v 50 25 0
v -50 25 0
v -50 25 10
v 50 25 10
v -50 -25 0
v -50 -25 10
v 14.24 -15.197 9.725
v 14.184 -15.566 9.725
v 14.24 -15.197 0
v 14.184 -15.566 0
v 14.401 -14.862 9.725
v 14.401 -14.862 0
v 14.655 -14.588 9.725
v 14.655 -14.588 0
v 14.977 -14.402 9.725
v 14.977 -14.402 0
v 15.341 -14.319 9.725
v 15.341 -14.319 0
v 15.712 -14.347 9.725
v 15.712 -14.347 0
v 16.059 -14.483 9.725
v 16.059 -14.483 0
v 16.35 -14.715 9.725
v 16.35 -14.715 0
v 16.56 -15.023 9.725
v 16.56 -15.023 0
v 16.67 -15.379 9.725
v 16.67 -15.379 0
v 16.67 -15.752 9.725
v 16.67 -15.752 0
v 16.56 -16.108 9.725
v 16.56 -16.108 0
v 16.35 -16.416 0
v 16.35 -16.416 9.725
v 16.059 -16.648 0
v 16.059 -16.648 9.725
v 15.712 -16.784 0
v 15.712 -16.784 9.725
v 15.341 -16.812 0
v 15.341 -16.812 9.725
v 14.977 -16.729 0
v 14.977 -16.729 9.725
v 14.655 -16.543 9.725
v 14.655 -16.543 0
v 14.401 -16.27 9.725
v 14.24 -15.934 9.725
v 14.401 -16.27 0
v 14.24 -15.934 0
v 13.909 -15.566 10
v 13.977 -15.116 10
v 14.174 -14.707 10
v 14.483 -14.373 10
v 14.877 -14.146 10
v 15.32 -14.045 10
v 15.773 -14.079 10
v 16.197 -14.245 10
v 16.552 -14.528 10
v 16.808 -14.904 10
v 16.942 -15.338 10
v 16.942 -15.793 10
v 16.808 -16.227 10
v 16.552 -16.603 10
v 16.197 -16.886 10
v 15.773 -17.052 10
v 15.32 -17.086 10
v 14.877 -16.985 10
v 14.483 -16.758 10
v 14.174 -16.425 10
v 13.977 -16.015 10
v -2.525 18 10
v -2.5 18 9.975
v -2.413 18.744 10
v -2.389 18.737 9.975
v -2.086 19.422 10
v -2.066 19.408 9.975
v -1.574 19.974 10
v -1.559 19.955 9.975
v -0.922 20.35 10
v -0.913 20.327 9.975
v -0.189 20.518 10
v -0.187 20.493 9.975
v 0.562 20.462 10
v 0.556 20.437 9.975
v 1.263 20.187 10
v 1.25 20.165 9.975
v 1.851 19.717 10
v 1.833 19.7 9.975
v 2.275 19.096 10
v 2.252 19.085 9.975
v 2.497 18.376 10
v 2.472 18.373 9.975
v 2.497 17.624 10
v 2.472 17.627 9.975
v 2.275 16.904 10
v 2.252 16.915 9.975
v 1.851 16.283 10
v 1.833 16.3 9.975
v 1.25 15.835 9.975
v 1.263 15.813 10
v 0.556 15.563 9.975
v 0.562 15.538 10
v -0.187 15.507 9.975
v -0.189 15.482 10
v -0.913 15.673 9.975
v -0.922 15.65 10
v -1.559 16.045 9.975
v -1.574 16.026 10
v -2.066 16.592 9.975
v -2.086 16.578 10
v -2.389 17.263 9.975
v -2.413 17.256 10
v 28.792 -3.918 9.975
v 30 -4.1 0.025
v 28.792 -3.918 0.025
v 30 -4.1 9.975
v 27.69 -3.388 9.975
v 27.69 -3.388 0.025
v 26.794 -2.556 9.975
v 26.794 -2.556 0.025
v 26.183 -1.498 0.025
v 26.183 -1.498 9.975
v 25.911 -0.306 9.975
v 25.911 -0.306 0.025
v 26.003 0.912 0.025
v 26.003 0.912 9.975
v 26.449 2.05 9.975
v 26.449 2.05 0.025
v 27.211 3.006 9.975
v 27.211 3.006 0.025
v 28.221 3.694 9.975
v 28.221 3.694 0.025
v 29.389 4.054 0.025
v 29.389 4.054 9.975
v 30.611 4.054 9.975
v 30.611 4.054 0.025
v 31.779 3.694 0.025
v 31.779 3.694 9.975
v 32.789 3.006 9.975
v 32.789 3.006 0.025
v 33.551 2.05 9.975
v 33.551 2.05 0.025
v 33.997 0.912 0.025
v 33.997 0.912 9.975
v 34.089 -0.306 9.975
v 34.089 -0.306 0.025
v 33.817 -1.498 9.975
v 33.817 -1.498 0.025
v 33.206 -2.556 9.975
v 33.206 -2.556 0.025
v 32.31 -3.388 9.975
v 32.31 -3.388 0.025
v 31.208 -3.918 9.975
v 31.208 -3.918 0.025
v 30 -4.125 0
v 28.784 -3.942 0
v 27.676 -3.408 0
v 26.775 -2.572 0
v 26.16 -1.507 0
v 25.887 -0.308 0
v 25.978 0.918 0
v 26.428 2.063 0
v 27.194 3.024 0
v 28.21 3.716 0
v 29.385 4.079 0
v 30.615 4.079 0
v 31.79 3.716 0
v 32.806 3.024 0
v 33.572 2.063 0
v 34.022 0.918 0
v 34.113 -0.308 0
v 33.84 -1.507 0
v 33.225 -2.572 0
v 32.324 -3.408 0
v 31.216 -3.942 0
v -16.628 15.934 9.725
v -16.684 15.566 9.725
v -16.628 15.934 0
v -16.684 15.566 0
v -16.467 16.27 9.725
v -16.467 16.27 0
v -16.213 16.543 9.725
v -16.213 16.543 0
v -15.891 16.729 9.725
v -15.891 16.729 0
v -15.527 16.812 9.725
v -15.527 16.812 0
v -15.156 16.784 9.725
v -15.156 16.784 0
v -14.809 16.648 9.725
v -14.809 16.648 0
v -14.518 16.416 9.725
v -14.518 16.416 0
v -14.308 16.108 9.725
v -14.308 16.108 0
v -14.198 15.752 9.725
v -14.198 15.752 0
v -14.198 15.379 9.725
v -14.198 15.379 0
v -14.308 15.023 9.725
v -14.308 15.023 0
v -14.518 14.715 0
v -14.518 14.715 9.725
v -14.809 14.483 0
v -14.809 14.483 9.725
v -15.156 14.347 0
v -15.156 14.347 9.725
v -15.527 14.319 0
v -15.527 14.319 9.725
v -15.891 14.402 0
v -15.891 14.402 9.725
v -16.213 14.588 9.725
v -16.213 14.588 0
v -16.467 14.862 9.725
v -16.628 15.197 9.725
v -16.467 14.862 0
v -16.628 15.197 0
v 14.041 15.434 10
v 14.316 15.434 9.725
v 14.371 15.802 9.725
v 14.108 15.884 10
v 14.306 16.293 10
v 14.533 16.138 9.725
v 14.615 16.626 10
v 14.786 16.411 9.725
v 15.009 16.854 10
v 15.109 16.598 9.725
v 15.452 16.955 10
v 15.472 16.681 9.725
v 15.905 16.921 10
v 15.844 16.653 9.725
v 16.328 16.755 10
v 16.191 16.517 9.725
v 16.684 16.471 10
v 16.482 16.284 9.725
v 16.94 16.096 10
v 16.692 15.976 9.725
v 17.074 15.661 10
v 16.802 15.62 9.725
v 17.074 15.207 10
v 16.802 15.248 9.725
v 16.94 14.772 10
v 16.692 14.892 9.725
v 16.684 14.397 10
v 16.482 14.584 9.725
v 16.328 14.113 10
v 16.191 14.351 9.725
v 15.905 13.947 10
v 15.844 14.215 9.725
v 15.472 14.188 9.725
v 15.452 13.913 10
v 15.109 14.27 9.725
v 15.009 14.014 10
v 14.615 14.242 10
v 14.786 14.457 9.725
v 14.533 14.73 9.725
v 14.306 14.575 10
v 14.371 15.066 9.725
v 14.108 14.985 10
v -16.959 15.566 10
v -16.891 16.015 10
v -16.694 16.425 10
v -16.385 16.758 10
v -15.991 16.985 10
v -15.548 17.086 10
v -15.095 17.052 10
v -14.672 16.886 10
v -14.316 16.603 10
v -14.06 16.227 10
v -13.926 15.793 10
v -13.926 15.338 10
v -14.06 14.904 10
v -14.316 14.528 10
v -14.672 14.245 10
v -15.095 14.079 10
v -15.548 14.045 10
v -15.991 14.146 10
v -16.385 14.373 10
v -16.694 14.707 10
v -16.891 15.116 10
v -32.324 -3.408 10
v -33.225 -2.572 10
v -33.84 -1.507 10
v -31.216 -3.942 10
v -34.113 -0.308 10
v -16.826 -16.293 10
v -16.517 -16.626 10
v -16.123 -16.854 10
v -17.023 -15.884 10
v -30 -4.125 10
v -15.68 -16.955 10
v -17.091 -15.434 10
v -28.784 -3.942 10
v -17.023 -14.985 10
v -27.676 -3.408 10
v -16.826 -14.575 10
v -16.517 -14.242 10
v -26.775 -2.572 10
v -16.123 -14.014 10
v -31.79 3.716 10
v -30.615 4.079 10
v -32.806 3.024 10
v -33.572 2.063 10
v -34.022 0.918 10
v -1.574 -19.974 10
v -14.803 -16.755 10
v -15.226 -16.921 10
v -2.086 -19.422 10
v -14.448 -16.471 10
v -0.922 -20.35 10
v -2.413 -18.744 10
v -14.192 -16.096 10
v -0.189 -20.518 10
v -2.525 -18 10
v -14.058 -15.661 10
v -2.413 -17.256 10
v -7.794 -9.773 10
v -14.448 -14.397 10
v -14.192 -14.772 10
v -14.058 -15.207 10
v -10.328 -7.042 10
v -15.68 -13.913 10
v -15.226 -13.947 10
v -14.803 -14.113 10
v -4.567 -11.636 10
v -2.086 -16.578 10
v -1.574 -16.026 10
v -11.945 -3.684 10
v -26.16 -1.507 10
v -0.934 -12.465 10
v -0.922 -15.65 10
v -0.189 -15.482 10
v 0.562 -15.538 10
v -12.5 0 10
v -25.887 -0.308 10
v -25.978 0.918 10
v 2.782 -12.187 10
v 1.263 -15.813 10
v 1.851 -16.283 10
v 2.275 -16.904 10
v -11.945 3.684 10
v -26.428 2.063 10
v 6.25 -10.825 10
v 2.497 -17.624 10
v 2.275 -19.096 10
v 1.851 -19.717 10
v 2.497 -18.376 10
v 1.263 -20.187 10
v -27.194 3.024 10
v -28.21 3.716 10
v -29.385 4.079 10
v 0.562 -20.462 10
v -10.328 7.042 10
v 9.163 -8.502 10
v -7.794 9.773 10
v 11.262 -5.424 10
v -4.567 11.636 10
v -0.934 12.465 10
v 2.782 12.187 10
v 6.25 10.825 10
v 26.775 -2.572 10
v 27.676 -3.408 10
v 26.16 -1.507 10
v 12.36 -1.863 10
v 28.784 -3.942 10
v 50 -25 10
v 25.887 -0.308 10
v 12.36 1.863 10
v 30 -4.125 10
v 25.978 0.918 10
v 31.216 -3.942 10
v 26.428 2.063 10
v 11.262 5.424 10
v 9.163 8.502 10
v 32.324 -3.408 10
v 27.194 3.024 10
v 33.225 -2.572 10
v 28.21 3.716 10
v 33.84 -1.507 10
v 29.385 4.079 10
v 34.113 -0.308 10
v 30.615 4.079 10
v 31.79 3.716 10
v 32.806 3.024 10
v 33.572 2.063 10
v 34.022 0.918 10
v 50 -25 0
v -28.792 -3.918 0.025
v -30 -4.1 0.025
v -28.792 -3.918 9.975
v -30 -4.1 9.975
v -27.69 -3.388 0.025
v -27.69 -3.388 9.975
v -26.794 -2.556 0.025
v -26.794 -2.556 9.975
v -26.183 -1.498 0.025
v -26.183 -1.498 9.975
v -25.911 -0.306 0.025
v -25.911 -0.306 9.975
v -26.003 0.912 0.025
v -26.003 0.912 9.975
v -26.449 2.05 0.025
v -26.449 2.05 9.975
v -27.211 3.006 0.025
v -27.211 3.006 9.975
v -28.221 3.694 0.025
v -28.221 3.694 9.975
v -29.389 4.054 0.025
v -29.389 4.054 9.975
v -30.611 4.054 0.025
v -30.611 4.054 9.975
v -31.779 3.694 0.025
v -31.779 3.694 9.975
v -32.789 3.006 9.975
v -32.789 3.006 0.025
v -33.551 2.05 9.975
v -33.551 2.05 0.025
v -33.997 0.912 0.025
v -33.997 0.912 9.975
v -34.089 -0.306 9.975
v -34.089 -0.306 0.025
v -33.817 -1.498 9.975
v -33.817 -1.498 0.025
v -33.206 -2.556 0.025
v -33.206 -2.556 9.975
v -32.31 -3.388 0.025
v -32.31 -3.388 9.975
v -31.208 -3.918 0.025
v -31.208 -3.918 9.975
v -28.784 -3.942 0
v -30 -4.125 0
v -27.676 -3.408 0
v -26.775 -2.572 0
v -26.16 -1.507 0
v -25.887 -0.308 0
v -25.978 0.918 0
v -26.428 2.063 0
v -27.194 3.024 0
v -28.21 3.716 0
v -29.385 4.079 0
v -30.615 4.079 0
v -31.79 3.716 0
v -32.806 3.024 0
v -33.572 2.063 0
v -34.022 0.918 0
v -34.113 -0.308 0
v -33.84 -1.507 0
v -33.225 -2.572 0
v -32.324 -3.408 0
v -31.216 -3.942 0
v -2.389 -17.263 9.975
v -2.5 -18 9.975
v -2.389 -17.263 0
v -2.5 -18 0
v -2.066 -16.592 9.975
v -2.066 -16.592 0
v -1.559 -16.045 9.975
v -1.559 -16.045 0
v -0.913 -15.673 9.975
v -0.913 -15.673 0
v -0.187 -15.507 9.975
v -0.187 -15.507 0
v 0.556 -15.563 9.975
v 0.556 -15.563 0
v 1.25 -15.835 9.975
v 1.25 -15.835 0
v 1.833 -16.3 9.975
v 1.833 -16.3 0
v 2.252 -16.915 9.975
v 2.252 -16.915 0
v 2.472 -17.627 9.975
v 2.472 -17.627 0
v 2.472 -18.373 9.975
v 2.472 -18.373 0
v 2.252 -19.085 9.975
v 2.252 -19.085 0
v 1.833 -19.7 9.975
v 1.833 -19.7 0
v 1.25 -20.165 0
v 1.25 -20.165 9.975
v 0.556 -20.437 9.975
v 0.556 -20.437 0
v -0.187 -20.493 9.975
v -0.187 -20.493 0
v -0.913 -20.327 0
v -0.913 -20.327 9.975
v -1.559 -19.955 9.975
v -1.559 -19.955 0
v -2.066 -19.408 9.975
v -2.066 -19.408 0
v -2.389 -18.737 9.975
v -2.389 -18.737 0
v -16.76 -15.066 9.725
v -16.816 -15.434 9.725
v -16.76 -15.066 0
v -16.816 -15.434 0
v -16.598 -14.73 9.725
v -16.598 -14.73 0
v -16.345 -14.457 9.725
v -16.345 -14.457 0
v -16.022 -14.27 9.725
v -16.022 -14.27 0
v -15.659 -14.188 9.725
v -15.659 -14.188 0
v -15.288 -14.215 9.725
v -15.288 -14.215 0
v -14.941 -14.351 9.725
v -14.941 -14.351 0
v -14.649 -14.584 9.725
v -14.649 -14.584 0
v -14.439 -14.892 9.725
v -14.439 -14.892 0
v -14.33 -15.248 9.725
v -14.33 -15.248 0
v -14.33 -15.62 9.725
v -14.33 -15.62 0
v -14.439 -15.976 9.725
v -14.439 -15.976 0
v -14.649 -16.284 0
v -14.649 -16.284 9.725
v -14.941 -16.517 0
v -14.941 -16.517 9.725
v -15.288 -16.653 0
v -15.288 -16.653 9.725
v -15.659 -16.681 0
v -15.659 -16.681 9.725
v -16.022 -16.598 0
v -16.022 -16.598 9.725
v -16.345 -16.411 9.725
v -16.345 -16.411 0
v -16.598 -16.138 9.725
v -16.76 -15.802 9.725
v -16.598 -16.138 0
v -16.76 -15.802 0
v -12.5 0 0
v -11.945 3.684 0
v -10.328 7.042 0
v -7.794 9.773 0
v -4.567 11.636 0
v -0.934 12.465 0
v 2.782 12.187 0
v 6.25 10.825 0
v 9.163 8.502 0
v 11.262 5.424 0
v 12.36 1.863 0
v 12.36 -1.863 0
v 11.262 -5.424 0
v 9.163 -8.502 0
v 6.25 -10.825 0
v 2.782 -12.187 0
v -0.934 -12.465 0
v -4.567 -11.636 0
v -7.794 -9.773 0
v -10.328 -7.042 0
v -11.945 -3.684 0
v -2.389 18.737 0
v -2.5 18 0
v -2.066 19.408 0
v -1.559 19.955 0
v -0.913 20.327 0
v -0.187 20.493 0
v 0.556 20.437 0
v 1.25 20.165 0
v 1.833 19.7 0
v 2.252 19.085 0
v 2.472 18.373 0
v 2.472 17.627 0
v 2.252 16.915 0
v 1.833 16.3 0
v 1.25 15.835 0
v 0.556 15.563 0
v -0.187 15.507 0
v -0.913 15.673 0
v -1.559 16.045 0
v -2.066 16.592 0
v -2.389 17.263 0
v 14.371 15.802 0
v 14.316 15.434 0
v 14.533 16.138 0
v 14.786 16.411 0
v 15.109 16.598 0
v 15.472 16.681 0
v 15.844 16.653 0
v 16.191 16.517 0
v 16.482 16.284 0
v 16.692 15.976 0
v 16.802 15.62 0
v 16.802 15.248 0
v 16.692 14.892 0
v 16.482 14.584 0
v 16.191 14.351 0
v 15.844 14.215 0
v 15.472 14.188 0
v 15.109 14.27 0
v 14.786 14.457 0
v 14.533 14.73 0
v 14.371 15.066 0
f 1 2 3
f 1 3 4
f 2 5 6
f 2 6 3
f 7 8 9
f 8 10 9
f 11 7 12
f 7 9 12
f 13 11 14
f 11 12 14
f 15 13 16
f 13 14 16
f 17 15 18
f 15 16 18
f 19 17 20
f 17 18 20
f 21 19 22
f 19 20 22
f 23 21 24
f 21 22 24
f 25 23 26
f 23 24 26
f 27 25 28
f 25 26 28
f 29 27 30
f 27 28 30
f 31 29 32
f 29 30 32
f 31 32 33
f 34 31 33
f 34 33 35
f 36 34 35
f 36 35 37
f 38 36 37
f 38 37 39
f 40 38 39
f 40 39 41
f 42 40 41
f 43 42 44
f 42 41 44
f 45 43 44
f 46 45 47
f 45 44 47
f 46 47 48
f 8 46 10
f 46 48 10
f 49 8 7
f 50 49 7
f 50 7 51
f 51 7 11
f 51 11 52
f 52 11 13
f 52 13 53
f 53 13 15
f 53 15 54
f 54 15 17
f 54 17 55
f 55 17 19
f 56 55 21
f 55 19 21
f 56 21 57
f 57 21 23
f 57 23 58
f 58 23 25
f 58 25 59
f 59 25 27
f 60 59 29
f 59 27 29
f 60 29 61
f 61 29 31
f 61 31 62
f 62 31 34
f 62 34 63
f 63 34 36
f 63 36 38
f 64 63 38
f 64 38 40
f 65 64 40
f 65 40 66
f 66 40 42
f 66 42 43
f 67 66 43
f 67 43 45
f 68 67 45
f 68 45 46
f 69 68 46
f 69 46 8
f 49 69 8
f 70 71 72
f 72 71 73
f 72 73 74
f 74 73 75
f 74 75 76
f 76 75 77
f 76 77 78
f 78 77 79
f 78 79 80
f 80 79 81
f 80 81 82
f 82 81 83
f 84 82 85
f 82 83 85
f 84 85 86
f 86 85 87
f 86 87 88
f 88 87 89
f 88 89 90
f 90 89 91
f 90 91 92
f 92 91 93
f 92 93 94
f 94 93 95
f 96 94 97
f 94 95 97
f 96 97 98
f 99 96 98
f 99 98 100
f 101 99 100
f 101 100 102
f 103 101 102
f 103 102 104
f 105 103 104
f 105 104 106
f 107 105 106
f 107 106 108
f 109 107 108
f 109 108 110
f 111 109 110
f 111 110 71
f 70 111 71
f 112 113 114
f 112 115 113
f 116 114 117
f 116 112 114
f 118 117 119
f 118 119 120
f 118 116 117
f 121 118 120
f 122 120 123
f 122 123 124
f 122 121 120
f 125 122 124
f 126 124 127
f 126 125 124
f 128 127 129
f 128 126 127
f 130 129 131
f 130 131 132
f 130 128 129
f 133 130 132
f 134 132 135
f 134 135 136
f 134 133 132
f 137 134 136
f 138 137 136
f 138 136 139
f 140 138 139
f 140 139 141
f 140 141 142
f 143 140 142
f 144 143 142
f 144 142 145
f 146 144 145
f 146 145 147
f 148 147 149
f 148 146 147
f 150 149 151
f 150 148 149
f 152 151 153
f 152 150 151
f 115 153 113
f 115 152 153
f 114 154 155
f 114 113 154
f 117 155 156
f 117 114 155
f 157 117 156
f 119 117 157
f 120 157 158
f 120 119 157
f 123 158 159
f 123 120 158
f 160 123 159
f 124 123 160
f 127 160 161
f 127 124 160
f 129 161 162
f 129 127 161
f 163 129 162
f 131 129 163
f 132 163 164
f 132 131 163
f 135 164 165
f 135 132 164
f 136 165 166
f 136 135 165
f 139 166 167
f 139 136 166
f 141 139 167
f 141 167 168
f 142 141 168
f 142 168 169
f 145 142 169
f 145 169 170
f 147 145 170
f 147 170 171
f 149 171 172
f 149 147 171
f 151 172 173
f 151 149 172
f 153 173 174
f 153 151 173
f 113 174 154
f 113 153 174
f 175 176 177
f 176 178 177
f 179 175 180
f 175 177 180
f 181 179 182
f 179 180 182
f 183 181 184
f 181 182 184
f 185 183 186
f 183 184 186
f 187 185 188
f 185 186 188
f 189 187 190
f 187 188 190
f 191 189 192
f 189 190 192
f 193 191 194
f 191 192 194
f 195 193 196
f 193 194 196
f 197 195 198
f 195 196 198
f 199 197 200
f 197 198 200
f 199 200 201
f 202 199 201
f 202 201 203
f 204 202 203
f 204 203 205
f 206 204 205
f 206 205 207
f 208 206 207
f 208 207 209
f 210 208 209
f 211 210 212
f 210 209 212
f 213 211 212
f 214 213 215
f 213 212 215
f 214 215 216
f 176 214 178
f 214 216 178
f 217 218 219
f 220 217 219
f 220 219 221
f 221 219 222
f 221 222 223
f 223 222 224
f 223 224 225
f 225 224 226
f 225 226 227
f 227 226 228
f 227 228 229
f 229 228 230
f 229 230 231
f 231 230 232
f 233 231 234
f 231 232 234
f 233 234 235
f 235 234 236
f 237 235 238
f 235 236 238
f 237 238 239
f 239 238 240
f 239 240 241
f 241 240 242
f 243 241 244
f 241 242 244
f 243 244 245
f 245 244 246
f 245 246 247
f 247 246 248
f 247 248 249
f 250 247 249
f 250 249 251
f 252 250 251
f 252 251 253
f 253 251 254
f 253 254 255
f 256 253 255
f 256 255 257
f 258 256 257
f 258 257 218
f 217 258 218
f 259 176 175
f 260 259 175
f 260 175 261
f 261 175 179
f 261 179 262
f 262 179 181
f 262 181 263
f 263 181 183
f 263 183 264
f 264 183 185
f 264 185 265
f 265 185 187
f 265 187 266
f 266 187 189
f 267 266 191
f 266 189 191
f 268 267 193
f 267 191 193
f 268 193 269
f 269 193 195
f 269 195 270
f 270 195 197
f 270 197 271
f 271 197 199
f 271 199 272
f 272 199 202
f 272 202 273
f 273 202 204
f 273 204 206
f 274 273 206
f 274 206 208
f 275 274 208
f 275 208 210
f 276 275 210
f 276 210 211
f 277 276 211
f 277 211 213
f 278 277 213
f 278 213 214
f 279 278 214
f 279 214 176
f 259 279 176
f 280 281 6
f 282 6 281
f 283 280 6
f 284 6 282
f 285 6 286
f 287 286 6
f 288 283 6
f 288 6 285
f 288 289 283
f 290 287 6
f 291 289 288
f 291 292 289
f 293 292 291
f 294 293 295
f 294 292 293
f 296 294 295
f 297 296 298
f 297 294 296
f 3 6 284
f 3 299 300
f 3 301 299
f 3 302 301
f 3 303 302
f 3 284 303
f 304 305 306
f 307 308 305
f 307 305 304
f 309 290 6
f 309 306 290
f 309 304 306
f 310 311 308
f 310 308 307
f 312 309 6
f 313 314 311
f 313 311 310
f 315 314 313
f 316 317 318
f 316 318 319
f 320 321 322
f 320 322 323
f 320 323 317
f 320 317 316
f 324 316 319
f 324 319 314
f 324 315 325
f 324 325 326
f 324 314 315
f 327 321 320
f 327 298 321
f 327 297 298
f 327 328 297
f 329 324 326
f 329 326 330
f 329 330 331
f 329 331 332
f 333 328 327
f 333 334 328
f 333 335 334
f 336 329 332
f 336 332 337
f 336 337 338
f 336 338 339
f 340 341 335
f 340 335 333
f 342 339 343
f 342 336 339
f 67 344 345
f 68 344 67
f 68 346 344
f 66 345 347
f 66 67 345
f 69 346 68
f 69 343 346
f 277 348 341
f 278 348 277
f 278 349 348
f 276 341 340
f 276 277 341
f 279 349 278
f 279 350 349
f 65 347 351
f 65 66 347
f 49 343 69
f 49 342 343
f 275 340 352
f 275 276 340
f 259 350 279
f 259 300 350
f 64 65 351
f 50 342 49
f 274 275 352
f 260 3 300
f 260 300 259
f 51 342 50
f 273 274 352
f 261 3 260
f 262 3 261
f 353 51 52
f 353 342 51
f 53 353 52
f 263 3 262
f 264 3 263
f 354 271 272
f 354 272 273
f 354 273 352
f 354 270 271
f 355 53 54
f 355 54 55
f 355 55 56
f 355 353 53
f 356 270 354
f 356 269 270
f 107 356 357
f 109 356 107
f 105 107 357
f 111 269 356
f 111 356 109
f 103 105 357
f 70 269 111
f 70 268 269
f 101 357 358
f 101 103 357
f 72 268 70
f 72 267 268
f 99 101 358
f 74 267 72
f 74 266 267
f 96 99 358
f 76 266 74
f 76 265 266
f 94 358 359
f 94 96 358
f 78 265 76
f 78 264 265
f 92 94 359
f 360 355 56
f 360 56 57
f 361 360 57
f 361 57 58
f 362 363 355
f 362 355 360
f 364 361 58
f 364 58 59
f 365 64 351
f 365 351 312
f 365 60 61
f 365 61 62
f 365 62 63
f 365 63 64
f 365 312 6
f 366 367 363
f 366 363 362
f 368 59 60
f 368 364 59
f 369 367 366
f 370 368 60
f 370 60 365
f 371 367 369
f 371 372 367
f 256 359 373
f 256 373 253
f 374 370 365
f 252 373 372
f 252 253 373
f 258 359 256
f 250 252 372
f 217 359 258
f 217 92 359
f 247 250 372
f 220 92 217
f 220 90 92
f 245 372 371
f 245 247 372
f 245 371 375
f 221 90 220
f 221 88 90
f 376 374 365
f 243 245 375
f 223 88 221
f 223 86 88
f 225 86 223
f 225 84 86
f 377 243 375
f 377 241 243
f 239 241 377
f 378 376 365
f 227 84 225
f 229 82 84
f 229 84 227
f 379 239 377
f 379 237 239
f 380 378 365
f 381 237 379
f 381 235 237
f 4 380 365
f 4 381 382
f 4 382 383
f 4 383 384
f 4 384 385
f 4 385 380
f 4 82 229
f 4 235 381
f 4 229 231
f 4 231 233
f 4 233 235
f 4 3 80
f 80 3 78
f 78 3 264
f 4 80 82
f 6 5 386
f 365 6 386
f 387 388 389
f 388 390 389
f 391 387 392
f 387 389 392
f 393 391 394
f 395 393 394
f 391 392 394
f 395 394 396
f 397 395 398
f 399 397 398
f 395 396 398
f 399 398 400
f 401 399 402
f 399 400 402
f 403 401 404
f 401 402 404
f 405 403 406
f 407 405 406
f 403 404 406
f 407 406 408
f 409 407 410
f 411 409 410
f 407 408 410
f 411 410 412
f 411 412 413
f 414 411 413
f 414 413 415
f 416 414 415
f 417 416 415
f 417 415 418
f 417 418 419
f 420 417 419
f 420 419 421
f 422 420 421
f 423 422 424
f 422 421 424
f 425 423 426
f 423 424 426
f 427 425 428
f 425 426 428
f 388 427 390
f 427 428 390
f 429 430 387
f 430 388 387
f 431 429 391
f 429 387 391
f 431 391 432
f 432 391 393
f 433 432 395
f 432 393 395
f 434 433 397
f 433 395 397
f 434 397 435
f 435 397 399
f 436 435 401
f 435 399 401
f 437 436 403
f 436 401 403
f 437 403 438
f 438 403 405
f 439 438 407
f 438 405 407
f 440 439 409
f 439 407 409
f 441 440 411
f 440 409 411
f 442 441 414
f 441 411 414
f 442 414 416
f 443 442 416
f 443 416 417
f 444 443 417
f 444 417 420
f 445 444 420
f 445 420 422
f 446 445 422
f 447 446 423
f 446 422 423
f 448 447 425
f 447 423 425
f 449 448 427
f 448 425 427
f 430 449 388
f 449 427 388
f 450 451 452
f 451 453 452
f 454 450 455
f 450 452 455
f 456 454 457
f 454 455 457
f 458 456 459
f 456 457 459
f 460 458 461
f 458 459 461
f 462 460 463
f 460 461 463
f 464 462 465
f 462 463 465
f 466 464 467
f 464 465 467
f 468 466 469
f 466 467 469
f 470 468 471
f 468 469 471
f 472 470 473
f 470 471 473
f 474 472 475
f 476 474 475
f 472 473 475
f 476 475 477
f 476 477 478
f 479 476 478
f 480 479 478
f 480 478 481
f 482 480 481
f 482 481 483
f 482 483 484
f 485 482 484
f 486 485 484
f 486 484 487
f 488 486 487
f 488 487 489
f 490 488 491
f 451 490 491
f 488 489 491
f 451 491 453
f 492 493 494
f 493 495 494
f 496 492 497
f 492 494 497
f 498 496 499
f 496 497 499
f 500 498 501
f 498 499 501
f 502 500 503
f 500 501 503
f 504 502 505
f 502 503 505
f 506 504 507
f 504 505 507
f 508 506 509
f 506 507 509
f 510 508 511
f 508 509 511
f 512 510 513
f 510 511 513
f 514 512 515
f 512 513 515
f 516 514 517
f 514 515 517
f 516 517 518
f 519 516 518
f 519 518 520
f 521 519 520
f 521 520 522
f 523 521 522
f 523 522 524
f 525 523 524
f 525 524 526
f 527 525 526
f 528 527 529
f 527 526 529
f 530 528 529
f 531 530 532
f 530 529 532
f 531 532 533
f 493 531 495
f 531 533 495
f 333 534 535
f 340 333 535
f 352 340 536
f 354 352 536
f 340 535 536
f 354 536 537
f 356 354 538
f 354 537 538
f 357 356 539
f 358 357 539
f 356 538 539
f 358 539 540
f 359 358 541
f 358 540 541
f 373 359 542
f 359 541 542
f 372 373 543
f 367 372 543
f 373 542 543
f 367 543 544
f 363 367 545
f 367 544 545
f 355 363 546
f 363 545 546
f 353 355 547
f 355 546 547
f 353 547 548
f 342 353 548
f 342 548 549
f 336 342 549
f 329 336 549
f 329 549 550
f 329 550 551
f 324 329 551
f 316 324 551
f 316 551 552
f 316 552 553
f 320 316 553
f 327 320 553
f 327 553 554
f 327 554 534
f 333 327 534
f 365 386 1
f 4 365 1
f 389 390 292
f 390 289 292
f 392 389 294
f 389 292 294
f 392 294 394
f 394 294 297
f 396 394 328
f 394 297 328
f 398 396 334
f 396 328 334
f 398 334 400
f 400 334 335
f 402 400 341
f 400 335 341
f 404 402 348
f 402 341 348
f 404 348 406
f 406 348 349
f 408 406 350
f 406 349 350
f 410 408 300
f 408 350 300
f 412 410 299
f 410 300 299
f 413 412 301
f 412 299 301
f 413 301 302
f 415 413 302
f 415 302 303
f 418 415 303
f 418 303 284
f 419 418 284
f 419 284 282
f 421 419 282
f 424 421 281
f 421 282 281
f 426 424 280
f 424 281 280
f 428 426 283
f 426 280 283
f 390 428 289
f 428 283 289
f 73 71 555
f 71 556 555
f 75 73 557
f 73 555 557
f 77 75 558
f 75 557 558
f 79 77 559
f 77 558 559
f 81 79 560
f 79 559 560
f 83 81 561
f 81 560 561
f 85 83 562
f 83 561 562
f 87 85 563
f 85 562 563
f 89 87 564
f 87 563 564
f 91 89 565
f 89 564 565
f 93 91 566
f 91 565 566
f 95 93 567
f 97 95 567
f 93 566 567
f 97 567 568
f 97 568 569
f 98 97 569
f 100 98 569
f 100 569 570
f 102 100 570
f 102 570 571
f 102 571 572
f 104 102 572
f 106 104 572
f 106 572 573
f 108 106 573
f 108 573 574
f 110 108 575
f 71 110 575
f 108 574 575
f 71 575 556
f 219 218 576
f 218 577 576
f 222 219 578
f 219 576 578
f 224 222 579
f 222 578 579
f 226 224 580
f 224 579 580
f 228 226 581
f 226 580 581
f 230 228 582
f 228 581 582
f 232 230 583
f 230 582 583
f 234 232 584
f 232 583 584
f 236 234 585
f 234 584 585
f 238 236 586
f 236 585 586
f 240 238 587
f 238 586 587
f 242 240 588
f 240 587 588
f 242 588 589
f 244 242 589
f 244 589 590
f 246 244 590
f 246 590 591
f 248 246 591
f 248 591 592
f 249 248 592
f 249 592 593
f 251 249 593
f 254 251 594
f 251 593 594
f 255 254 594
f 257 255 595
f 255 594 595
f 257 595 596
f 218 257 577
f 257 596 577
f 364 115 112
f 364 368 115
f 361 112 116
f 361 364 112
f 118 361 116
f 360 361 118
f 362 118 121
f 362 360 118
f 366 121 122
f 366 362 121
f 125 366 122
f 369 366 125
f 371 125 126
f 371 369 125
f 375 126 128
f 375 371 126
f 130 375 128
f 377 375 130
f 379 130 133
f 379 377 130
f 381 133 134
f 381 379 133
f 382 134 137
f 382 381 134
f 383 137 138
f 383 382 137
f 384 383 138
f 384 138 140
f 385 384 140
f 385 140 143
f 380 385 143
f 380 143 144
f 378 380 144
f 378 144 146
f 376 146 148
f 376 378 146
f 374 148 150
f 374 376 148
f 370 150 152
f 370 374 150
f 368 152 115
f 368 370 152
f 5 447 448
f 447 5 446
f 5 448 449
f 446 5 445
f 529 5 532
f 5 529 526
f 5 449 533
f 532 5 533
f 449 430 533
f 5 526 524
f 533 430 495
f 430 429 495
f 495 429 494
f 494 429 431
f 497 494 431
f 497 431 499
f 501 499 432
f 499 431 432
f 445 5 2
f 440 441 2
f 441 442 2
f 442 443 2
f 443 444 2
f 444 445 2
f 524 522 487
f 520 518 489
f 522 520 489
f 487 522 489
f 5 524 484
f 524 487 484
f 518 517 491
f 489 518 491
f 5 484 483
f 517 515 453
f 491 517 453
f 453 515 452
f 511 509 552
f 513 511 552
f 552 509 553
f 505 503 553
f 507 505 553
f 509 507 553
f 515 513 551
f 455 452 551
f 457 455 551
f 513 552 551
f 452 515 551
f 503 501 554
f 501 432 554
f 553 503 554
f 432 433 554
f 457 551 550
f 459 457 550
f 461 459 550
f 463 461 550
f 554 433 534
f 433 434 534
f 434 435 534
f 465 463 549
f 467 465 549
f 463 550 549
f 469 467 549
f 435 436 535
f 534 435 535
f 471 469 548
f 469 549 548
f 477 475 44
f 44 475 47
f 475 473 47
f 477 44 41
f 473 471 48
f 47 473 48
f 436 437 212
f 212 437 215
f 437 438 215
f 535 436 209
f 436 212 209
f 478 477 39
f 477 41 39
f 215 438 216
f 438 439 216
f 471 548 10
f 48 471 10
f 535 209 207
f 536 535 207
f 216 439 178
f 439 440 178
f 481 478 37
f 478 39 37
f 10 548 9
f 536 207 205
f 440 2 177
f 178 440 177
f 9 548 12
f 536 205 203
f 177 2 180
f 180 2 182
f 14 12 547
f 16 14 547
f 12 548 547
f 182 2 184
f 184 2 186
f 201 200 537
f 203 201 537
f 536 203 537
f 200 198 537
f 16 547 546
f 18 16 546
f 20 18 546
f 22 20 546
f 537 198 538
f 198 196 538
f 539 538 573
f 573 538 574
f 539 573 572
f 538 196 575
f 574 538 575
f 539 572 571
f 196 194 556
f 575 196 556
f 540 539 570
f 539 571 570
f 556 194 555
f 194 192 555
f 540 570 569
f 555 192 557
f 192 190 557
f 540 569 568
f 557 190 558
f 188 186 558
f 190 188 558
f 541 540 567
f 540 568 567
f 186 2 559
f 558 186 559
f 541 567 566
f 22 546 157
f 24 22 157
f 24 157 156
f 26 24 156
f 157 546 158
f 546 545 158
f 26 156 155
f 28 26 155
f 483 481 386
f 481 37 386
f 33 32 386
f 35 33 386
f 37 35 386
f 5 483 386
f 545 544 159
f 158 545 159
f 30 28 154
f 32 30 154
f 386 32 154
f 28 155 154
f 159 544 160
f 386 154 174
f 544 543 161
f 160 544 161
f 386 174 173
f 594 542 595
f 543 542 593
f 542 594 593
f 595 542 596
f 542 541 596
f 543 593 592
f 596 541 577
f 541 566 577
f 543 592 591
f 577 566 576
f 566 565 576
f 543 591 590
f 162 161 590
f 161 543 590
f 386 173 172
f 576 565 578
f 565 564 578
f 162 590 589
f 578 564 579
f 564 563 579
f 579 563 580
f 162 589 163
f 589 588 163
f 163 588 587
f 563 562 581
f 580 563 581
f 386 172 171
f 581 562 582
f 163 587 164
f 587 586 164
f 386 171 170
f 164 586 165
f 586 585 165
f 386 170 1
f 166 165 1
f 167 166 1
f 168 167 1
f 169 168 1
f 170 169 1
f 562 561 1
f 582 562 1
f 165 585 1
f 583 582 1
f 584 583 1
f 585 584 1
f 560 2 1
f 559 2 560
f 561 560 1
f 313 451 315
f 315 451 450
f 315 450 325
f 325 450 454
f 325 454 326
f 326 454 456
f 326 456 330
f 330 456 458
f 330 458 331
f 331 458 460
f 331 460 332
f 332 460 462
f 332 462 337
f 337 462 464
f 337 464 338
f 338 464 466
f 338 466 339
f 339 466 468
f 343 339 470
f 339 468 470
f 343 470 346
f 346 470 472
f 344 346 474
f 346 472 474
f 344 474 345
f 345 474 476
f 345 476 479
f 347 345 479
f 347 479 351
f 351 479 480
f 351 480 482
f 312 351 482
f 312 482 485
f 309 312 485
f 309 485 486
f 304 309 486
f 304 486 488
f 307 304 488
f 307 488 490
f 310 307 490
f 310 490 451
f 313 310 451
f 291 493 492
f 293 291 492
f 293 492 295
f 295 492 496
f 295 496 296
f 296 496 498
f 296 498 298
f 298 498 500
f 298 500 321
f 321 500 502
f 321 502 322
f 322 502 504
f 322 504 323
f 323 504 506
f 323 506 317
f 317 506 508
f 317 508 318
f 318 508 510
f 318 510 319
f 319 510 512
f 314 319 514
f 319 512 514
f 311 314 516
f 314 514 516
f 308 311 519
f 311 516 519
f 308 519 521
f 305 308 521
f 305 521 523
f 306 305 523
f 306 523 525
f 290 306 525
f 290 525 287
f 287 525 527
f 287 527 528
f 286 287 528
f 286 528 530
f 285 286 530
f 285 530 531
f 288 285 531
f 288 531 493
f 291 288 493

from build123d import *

# Parameters (mm, degrees)
SKETCH_1_W                      = 100
SKETCH_1_H                      = 50
EXTRUDE_1_DEPTH                 = 10
HOLE_WIZARD_5_0_5_1_D           = 5
HOLE_WIZARD_5_0_5_1_CSINK_D     = 5.05
HOLE_WIZARD_5_0_5_1_CSINK_ANGLE = 90
SKETCH_20_R                     = 5
CUT_EXTRUDE_1_DEPTH             = 57.789083458
SKETCH_26_R                     = 12.5
CUT_EXTRUDE_2_DEPTH             = 2.5
HOLE_WIZARD_M3_1_D              = 2.5
HOLE_WIZARD_M3_1_CSINK_D        = 3.05
HOLE_WIZARD_M3_1_CSINK_ANGLE    = 90
SKETCH_35_R                     = 12.5
CUT_EXTRUDE_3_DEPTH             = 57.402570863


with BuildPart() as part:
    # 草图1 → 凸台-拉伸1 (new body)
    with BuildSketch(Plane.XY):
        Rectangle(SKETCH_1_W, SKETCH_1_H)
    extrude(amount=EXTRUDE_1_DEPTH)

    # Ø5.0 (5) 直径孔1 (through all)
    with Locations(Plane.XY.offset(10)):
        with Locations((0, 18), (0, -18)):
            CounterSinkHole(HOLE_WIZARD_5_0_5_1_D / 2, HOLE_WIZARD_5_0_5_1_CSINK_D / 2, counter_sink_angle=HOLE_WIZARD_5_0_5_1_CSINK_ANGLE)

    # 草图20 → 切除-拉伸1 (cut, through all)
    with BuildSketch(Plane.XY.offset(10)):
        Circle(SKETCH_20_R)
    extrude(amount=-CUT_EXTRUDE_1_DEPTH, mode=Mode.SUBTRACT)

    # 草图25 → Ø8.2 (8.2) 直径孔1 (revolve, cut)
    with BuildSketch(Plane(origin=(30, 0, 10), x_dir=(0, -1, 0), z_dir=(1, 0, 0))):
        Polygon((0, 0), (0, 10), (4.125, 10), (4.1, 9.975), (4.1, 0.025), (4.125, 0), align=None)
    hole_wizard_8_2_8_2_1 = revolve(axis=Axis((30, 0, 16.35), (0, 0, -1)), mode=Mode.SUBTRACT)

    # 镜向1: Ø8.2 (8.2) 直径孔1 across plane
    add(hole_wizard_8_2_8_2_1.mirror(Plane(origin=(0, 0, 0), x_dir=(0, 0, 1), z_dir=(1, 0, 0))), mode=Mode.SUBTRACT)

    # 草图26 → 切除-拉伸2 (cut)
    with BuildSketch(Plane(origin=(0, 0, 0), x_dir=(-1, 0, 0), z_dir=(0, 0, -1))):
        Circle(SKETCH_26_R)
    extrude(amount=-CUT_EXTRUDE_2_DEPTH, mode=Mode.SUBTRACT)

    # M3 螺纹孔1 (through all)
    with Locations(Plane.XY.offset(10)):
        with Locations((15.565692097, 15.434028299), (15.434028299, -15.565692097), (-15.565692097, -15.434028299), (-15.434028299, 15.565692097)):
            CounterSinkHole(HOLE_WIZARD_M3_1_D / 2, HOLE_WIZARD_M3_1_CSINK_D / 2, counter_sink_angle=HOLE_WIZARD_M3_1_CSINK_ANGLE)

    # 草图35 → 切除-拉伸3 (cut, through all)
    with BuildSketch(Plane(origin=(0, 0, 2.5), x_dir=(-1, 0, 0), z_dir=(0, 0, -1))):
        Circle(SKETCH_35_R)
    extrude(amount=-CUT_EXTRUDE_3_DEPTH, mode=Mode.SUBTRACT)


solid = part.part
